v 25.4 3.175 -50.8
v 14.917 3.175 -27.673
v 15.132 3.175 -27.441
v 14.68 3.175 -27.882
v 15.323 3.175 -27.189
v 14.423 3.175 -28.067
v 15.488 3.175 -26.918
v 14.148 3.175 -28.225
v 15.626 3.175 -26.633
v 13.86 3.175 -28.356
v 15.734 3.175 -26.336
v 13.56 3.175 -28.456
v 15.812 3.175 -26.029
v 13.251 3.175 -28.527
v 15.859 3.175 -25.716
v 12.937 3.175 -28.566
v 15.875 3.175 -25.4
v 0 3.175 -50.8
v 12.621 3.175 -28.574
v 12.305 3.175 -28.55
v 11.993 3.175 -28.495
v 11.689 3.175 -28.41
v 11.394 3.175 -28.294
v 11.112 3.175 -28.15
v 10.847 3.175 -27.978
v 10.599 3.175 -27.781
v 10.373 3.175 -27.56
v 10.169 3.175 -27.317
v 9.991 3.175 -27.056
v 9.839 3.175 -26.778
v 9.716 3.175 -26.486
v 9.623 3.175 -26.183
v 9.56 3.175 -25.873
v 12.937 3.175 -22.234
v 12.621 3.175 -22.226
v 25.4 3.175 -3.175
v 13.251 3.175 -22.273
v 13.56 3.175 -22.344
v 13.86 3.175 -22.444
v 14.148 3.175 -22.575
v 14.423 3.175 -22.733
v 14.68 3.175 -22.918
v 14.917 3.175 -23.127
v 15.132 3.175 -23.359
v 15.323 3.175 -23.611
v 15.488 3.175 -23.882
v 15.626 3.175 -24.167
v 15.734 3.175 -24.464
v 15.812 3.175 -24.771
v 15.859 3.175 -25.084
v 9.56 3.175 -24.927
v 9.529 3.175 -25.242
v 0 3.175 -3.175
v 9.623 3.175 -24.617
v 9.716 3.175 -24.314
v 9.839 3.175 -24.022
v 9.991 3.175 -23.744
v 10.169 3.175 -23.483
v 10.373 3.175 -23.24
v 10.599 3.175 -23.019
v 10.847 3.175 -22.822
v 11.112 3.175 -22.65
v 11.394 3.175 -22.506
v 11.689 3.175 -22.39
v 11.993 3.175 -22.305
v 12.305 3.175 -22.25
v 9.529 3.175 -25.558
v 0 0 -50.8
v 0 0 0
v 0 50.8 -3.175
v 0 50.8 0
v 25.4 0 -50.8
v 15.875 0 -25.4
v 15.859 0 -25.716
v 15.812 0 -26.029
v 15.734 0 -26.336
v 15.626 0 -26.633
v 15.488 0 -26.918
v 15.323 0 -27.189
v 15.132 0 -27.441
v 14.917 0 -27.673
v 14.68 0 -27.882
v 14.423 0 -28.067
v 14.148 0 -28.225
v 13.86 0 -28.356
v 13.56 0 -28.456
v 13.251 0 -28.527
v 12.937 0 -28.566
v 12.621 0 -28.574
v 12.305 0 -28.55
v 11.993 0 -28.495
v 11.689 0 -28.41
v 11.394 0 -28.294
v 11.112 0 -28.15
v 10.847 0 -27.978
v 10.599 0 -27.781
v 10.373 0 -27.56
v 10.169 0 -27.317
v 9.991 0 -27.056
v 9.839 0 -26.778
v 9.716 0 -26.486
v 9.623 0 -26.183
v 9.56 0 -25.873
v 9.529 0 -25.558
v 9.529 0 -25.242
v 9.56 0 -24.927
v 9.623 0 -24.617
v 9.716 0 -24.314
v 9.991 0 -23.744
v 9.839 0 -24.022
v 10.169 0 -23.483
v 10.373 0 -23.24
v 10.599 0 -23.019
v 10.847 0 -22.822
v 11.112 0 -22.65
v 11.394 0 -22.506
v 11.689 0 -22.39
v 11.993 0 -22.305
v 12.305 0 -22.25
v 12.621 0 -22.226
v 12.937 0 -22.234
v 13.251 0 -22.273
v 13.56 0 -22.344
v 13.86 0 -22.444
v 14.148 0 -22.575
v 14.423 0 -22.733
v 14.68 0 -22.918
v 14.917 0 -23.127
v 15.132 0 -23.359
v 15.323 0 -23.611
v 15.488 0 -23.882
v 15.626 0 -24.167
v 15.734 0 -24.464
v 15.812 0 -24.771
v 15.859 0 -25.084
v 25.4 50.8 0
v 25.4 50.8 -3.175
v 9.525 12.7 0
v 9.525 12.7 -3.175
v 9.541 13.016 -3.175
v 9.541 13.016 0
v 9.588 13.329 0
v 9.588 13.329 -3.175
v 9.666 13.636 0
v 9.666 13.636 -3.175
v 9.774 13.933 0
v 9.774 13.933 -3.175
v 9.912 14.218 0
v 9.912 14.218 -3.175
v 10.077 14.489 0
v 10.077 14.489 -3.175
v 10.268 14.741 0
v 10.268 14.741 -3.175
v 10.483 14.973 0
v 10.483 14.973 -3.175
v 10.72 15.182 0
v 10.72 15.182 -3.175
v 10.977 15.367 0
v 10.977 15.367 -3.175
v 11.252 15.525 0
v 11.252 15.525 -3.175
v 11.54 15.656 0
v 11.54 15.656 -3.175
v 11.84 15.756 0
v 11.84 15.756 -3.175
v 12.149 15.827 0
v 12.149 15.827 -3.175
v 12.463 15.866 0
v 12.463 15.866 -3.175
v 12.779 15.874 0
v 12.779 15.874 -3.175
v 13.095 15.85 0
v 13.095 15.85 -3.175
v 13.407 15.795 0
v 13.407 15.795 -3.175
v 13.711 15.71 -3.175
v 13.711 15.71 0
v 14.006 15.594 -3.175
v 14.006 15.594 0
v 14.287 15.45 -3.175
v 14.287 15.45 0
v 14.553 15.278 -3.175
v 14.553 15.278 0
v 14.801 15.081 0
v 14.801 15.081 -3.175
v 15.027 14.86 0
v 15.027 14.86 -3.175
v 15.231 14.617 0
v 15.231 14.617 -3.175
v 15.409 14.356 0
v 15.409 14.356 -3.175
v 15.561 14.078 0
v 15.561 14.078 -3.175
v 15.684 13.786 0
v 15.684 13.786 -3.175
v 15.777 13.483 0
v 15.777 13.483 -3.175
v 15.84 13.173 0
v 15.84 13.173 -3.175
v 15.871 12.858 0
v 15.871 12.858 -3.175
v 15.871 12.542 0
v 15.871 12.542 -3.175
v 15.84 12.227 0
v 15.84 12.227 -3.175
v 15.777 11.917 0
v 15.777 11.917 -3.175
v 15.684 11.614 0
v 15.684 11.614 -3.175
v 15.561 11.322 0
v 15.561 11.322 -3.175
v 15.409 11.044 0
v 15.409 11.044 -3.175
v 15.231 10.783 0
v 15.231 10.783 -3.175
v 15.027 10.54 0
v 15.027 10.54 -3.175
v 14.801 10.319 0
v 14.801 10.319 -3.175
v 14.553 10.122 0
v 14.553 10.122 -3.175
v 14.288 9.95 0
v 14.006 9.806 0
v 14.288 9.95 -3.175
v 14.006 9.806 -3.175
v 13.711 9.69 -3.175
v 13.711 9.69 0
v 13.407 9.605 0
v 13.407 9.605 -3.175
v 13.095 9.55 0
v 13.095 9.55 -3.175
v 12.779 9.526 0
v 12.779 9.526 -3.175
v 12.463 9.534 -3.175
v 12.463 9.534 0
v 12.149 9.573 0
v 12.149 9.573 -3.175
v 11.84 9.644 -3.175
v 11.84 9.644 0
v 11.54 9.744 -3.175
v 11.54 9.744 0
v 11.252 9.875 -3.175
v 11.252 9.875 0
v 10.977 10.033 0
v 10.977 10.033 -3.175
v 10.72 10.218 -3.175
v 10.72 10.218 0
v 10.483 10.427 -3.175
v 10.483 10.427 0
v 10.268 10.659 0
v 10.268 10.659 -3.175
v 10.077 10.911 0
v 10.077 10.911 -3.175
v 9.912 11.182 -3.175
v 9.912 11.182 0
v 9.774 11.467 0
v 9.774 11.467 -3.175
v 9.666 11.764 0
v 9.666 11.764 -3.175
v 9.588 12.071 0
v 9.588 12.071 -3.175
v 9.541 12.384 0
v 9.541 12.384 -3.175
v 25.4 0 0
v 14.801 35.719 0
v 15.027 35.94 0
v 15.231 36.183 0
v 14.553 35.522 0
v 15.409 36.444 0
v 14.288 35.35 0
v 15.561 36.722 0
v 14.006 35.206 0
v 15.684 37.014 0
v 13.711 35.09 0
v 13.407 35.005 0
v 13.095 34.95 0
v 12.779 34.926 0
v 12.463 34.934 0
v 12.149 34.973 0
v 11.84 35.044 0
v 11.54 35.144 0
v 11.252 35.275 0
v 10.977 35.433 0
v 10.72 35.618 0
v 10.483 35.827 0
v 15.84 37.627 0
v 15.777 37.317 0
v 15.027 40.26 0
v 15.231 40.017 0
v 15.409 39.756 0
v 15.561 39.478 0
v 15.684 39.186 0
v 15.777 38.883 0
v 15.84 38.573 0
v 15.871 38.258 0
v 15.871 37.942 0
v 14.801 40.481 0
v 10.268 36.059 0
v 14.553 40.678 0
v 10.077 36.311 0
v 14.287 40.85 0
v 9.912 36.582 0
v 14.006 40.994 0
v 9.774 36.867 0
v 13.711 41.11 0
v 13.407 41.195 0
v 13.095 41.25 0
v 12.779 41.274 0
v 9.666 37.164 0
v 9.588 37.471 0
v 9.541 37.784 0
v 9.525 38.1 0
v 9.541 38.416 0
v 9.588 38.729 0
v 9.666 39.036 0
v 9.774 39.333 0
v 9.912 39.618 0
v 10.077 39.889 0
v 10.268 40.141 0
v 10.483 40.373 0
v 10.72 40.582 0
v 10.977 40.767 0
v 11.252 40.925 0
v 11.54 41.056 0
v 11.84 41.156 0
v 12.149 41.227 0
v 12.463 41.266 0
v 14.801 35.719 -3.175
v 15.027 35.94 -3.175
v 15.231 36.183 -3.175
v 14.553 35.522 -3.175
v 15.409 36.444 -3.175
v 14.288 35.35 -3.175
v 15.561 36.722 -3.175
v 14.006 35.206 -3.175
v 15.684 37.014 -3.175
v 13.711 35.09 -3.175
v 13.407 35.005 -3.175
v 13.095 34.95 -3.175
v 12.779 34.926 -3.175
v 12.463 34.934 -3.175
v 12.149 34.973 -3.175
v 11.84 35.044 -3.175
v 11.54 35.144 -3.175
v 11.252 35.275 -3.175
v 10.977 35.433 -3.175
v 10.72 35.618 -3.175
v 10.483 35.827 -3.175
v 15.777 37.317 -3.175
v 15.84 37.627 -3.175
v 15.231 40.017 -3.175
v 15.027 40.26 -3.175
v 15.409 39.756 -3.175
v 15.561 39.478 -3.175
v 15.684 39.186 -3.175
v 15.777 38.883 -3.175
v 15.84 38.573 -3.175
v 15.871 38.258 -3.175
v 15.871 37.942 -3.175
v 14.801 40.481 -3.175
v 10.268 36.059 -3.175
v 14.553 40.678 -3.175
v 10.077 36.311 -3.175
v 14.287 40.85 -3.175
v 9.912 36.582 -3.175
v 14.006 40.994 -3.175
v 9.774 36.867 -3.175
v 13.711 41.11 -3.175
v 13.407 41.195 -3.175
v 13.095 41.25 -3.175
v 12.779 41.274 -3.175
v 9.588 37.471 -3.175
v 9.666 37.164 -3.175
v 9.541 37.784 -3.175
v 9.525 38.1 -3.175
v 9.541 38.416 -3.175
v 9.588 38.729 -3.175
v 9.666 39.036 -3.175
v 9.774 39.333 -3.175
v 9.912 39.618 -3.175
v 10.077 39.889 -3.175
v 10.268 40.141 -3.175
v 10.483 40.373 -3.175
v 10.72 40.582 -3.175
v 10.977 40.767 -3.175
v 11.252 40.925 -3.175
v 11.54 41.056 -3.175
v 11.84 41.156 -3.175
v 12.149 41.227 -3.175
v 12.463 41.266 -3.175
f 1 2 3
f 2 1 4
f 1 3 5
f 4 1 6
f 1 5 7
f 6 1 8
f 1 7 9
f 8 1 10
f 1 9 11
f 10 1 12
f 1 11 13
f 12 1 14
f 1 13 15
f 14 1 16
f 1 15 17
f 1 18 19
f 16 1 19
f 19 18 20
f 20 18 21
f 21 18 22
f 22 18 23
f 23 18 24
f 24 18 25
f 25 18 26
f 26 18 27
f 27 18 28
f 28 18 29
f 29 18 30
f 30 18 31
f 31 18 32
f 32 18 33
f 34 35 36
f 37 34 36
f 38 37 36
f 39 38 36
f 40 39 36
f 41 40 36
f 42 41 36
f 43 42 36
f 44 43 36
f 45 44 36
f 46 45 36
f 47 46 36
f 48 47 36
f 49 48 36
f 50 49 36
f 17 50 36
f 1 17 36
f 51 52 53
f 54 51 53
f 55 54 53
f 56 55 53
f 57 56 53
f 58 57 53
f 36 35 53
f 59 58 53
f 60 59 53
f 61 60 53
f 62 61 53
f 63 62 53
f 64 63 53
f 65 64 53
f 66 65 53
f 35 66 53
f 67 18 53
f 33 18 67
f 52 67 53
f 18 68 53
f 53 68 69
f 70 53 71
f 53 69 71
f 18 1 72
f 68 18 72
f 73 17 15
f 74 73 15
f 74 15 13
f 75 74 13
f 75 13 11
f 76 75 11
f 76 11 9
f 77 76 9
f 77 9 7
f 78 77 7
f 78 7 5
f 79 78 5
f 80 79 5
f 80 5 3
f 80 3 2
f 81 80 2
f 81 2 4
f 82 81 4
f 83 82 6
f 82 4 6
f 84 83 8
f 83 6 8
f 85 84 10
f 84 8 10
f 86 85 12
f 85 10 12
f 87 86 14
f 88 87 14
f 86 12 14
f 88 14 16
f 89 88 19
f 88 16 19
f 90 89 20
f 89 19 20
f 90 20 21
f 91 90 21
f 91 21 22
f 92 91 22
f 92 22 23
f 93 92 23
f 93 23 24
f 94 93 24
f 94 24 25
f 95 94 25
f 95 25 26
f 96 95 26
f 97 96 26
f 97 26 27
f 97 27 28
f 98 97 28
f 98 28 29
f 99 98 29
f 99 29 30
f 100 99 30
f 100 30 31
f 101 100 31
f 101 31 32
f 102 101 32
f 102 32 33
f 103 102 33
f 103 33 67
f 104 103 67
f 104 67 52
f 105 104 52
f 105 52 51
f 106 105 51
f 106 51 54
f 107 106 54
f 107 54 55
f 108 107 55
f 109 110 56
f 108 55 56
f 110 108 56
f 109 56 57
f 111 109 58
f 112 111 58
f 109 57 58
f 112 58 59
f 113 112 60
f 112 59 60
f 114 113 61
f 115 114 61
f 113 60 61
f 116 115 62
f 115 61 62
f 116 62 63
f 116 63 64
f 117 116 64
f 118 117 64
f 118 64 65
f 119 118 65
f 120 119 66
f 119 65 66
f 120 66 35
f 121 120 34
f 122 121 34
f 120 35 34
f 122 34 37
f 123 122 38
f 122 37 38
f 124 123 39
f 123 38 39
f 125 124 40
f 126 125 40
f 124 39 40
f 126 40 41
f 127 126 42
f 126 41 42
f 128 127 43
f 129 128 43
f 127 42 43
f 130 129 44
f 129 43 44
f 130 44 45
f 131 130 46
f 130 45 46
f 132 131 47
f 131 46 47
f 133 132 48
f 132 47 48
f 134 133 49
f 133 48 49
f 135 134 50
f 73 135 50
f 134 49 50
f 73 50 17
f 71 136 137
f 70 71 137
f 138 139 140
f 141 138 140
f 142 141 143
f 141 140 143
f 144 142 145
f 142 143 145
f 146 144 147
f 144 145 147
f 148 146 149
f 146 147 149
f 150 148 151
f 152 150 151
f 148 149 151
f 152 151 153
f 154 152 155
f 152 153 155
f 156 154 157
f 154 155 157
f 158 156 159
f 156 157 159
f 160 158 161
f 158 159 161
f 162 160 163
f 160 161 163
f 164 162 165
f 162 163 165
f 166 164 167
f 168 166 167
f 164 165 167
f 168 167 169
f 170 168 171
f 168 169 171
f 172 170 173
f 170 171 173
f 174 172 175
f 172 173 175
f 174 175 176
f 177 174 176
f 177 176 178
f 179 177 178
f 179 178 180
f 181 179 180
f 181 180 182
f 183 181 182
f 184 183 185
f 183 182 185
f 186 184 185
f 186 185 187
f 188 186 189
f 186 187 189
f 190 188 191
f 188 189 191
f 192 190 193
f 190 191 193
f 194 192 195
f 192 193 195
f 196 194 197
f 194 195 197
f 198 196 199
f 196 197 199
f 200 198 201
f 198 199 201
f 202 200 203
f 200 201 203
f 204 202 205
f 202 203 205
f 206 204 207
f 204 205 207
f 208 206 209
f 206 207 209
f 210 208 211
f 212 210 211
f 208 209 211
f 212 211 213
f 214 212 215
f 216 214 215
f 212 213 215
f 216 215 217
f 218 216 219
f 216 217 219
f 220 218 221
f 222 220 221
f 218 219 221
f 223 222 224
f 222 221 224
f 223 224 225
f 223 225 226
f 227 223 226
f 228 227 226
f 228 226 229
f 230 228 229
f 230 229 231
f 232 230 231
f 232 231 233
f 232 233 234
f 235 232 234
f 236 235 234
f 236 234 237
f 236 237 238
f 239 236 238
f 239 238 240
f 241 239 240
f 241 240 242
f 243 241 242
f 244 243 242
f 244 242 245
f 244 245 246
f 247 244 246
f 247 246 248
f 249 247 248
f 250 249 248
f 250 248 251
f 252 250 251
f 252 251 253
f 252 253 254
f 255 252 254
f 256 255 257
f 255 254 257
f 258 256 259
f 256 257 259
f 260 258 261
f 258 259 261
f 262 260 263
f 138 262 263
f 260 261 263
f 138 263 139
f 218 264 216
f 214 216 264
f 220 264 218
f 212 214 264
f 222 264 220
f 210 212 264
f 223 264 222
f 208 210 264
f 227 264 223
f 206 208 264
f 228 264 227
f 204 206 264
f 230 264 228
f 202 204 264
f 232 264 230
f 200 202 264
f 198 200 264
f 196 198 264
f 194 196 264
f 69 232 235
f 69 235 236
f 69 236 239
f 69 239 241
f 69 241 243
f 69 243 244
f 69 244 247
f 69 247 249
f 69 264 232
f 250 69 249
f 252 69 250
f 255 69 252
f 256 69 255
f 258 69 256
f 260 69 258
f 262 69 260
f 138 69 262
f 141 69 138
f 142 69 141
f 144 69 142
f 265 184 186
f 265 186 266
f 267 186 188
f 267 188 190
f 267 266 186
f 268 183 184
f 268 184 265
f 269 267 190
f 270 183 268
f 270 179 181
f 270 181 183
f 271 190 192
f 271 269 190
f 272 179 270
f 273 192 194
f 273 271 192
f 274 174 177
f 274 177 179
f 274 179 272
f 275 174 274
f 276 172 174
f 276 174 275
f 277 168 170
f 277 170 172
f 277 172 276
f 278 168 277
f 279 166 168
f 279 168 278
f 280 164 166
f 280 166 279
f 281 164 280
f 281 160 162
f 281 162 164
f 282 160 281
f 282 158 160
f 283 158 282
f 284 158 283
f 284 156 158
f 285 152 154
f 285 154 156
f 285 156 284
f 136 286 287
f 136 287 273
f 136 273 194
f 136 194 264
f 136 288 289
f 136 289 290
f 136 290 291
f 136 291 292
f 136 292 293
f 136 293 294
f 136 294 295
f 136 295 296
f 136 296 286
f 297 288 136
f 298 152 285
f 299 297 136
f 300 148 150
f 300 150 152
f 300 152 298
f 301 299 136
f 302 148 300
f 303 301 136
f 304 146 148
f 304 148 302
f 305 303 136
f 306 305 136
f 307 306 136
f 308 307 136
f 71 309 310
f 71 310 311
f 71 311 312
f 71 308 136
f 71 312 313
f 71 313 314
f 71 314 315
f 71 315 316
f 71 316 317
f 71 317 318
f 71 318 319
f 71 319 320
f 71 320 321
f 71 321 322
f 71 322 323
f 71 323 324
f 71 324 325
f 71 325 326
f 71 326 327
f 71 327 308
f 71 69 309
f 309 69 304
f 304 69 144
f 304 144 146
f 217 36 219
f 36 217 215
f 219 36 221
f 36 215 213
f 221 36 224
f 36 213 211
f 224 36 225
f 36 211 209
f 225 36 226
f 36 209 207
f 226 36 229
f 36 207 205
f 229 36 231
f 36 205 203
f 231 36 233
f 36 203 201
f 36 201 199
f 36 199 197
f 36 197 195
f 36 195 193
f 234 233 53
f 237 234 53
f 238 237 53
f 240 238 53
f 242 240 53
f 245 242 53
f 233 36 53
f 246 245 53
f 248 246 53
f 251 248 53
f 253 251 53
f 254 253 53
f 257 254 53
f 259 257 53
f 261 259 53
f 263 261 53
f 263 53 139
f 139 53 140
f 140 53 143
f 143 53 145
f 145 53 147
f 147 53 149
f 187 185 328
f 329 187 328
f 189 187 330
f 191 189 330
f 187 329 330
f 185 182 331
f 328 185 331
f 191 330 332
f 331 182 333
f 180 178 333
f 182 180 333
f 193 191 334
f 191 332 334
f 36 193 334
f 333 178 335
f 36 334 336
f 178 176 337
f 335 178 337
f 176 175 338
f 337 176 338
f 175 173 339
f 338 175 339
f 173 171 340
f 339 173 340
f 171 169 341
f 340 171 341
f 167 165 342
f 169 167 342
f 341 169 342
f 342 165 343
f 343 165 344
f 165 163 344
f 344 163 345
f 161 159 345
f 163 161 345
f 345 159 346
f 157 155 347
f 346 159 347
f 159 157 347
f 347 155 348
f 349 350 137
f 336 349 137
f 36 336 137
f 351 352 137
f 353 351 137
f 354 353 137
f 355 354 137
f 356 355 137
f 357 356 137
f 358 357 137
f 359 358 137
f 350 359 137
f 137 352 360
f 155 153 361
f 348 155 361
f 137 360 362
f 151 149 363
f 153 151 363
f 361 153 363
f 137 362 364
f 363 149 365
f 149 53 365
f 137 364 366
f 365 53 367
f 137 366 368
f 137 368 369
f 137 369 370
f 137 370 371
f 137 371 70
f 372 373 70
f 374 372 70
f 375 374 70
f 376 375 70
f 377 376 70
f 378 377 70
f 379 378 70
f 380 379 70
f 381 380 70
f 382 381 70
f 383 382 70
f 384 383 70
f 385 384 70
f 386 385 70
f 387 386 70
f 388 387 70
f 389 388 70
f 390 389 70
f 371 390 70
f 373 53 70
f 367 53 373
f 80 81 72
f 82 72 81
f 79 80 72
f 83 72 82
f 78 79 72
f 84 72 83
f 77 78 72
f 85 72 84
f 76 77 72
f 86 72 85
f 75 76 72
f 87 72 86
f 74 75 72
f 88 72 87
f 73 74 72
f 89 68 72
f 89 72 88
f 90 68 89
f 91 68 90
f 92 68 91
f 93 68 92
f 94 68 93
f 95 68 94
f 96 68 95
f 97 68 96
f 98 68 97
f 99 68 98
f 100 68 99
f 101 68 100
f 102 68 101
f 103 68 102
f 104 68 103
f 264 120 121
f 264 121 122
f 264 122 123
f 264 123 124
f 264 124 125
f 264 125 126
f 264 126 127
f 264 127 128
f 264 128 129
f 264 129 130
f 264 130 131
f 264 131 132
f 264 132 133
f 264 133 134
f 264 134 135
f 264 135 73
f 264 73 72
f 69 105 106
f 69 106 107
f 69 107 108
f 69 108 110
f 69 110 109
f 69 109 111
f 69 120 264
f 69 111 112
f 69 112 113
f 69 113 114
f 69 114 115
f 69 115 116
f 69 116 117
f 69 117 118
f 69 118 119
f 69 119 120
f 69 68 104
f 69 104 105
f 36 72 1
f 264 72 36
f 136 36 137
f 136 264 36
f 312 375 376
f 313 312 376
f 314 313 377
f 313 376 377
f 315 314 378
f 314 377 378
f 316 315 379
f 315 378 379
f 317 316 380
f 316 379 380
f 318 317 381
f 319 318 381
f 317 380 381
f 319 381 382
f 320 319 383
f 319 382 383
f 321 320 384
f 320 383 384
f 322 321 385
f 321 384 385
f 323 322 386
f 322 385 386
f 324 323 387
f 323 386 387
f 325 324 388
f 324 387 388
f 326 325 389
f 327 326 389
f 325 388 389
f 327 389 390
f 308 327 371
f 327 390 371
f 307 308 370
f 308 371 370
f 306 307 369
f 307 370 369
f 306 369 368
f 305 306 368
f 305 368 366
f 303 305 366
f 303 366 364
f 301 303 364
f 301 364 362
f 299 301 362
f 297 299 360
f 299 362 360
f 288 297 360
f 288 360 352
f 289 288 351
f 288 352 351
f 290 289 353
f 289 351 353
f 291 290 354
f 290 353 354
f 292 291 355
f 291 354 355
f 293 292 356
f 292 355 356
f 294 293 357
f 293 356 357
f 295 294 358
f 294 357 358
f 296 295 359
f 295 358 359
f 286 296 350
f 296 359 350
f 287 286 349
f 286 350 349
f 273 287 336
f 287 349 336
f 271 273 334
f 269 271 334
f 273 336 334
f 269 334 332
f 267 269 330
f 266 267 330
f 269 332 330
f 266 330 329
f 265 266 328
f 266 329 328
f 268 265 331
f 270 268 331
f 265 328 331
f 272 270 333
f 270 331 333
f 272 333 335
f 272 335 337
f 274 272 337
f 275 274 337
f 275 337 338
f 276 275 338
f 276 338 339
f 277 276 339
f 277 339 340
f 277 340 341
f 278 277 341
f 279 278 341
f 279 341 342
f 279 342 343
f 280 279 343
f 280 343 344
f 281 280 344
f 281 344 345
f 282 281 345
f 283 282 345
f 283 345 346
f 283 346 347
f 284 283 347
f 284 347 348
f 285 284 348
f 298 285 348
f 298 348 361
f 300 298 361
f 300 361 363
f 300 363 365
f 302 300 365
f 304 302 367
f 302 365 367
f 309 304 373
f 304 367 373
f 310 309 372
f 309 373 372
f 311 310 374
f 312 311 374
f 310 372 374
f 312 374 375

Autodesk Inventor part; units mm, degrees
ref_plane "YZ Plane" through (0, 0, 0) normal (1, 0, 0) x (0, 1, 0)
ref_plane "XZ Plane" through (0, 0, 0) normal (0, 1, 0) x (-1, 0, 0)
ref_plane "XY Plane" through (0, 0, 0) normal (0, 0, 1) x (1, 0, 0)
sketch "Sketch1" plane through (0, 0, 0) normal (1, 0, 0) x (0, 1, 0)
  line L0 (0, 0) -> (50.8, 0)
  line L1 (50.8, 0) -> (50.8, -3.175)
  line L2 (3.175, -50.8) -> (0, -50.8)
  line L3 (0, -50.8) -> (0, 0)
  line L4 (3.175, -50.8) -> (3.175, -3.175)
  line L5 (3.175, -3.175) -> (50.8, -3.175)
  dimension "d0" = 3.175
  dimension "d1" = 50.8
extrude "Extrusion1" add sketch "Sketch1" along normal blind 25.4
sketch "Sketch2" plane through (0, 3.175, -3.175) normal (0, 1, 0) x (1, 0, 0)
  line L0 (0, 47.625) -> (25.4, 47.625) projected
  line L1 (12.7, 47.625) -> (12.7, 11.1903) construction
  circle A0 centre (12.7, 22.225) radius 3.175
  line L2 (0, -3.175) -> (25.4, -3.175) projected
  dimension "d4" = 6.35
  dimension "d5" = 25.4
extrude "Extrusion2" cut sketch "Sketch2" against normal blind 3.175
sketch "Sketch4" plane through (0, 3.175, -3.175) normal (0, 0, -1) x (-1, 0, 0)
  line L0 (0, 47.625) -> (-25.4, 47.625) projected
  line L1 (-12.7, 47.625) -> (-12.7, 26.8905) construction
  circle A0 centre (-12.7, 34.925) radius 3.175
  circle A1 centre (-12.7, 9.525) radius 3.175
  line L2 (0, -3.175) -> (-25.4, -3.175) projected
  dimension "d8" = 6.35
  dimension "d9" = 12.7
  dimension "d10" = 38.1
extrude "Extrusion3" cut sketch "Sketch4" against normal blind 3.175
properties part number "Bracket"
